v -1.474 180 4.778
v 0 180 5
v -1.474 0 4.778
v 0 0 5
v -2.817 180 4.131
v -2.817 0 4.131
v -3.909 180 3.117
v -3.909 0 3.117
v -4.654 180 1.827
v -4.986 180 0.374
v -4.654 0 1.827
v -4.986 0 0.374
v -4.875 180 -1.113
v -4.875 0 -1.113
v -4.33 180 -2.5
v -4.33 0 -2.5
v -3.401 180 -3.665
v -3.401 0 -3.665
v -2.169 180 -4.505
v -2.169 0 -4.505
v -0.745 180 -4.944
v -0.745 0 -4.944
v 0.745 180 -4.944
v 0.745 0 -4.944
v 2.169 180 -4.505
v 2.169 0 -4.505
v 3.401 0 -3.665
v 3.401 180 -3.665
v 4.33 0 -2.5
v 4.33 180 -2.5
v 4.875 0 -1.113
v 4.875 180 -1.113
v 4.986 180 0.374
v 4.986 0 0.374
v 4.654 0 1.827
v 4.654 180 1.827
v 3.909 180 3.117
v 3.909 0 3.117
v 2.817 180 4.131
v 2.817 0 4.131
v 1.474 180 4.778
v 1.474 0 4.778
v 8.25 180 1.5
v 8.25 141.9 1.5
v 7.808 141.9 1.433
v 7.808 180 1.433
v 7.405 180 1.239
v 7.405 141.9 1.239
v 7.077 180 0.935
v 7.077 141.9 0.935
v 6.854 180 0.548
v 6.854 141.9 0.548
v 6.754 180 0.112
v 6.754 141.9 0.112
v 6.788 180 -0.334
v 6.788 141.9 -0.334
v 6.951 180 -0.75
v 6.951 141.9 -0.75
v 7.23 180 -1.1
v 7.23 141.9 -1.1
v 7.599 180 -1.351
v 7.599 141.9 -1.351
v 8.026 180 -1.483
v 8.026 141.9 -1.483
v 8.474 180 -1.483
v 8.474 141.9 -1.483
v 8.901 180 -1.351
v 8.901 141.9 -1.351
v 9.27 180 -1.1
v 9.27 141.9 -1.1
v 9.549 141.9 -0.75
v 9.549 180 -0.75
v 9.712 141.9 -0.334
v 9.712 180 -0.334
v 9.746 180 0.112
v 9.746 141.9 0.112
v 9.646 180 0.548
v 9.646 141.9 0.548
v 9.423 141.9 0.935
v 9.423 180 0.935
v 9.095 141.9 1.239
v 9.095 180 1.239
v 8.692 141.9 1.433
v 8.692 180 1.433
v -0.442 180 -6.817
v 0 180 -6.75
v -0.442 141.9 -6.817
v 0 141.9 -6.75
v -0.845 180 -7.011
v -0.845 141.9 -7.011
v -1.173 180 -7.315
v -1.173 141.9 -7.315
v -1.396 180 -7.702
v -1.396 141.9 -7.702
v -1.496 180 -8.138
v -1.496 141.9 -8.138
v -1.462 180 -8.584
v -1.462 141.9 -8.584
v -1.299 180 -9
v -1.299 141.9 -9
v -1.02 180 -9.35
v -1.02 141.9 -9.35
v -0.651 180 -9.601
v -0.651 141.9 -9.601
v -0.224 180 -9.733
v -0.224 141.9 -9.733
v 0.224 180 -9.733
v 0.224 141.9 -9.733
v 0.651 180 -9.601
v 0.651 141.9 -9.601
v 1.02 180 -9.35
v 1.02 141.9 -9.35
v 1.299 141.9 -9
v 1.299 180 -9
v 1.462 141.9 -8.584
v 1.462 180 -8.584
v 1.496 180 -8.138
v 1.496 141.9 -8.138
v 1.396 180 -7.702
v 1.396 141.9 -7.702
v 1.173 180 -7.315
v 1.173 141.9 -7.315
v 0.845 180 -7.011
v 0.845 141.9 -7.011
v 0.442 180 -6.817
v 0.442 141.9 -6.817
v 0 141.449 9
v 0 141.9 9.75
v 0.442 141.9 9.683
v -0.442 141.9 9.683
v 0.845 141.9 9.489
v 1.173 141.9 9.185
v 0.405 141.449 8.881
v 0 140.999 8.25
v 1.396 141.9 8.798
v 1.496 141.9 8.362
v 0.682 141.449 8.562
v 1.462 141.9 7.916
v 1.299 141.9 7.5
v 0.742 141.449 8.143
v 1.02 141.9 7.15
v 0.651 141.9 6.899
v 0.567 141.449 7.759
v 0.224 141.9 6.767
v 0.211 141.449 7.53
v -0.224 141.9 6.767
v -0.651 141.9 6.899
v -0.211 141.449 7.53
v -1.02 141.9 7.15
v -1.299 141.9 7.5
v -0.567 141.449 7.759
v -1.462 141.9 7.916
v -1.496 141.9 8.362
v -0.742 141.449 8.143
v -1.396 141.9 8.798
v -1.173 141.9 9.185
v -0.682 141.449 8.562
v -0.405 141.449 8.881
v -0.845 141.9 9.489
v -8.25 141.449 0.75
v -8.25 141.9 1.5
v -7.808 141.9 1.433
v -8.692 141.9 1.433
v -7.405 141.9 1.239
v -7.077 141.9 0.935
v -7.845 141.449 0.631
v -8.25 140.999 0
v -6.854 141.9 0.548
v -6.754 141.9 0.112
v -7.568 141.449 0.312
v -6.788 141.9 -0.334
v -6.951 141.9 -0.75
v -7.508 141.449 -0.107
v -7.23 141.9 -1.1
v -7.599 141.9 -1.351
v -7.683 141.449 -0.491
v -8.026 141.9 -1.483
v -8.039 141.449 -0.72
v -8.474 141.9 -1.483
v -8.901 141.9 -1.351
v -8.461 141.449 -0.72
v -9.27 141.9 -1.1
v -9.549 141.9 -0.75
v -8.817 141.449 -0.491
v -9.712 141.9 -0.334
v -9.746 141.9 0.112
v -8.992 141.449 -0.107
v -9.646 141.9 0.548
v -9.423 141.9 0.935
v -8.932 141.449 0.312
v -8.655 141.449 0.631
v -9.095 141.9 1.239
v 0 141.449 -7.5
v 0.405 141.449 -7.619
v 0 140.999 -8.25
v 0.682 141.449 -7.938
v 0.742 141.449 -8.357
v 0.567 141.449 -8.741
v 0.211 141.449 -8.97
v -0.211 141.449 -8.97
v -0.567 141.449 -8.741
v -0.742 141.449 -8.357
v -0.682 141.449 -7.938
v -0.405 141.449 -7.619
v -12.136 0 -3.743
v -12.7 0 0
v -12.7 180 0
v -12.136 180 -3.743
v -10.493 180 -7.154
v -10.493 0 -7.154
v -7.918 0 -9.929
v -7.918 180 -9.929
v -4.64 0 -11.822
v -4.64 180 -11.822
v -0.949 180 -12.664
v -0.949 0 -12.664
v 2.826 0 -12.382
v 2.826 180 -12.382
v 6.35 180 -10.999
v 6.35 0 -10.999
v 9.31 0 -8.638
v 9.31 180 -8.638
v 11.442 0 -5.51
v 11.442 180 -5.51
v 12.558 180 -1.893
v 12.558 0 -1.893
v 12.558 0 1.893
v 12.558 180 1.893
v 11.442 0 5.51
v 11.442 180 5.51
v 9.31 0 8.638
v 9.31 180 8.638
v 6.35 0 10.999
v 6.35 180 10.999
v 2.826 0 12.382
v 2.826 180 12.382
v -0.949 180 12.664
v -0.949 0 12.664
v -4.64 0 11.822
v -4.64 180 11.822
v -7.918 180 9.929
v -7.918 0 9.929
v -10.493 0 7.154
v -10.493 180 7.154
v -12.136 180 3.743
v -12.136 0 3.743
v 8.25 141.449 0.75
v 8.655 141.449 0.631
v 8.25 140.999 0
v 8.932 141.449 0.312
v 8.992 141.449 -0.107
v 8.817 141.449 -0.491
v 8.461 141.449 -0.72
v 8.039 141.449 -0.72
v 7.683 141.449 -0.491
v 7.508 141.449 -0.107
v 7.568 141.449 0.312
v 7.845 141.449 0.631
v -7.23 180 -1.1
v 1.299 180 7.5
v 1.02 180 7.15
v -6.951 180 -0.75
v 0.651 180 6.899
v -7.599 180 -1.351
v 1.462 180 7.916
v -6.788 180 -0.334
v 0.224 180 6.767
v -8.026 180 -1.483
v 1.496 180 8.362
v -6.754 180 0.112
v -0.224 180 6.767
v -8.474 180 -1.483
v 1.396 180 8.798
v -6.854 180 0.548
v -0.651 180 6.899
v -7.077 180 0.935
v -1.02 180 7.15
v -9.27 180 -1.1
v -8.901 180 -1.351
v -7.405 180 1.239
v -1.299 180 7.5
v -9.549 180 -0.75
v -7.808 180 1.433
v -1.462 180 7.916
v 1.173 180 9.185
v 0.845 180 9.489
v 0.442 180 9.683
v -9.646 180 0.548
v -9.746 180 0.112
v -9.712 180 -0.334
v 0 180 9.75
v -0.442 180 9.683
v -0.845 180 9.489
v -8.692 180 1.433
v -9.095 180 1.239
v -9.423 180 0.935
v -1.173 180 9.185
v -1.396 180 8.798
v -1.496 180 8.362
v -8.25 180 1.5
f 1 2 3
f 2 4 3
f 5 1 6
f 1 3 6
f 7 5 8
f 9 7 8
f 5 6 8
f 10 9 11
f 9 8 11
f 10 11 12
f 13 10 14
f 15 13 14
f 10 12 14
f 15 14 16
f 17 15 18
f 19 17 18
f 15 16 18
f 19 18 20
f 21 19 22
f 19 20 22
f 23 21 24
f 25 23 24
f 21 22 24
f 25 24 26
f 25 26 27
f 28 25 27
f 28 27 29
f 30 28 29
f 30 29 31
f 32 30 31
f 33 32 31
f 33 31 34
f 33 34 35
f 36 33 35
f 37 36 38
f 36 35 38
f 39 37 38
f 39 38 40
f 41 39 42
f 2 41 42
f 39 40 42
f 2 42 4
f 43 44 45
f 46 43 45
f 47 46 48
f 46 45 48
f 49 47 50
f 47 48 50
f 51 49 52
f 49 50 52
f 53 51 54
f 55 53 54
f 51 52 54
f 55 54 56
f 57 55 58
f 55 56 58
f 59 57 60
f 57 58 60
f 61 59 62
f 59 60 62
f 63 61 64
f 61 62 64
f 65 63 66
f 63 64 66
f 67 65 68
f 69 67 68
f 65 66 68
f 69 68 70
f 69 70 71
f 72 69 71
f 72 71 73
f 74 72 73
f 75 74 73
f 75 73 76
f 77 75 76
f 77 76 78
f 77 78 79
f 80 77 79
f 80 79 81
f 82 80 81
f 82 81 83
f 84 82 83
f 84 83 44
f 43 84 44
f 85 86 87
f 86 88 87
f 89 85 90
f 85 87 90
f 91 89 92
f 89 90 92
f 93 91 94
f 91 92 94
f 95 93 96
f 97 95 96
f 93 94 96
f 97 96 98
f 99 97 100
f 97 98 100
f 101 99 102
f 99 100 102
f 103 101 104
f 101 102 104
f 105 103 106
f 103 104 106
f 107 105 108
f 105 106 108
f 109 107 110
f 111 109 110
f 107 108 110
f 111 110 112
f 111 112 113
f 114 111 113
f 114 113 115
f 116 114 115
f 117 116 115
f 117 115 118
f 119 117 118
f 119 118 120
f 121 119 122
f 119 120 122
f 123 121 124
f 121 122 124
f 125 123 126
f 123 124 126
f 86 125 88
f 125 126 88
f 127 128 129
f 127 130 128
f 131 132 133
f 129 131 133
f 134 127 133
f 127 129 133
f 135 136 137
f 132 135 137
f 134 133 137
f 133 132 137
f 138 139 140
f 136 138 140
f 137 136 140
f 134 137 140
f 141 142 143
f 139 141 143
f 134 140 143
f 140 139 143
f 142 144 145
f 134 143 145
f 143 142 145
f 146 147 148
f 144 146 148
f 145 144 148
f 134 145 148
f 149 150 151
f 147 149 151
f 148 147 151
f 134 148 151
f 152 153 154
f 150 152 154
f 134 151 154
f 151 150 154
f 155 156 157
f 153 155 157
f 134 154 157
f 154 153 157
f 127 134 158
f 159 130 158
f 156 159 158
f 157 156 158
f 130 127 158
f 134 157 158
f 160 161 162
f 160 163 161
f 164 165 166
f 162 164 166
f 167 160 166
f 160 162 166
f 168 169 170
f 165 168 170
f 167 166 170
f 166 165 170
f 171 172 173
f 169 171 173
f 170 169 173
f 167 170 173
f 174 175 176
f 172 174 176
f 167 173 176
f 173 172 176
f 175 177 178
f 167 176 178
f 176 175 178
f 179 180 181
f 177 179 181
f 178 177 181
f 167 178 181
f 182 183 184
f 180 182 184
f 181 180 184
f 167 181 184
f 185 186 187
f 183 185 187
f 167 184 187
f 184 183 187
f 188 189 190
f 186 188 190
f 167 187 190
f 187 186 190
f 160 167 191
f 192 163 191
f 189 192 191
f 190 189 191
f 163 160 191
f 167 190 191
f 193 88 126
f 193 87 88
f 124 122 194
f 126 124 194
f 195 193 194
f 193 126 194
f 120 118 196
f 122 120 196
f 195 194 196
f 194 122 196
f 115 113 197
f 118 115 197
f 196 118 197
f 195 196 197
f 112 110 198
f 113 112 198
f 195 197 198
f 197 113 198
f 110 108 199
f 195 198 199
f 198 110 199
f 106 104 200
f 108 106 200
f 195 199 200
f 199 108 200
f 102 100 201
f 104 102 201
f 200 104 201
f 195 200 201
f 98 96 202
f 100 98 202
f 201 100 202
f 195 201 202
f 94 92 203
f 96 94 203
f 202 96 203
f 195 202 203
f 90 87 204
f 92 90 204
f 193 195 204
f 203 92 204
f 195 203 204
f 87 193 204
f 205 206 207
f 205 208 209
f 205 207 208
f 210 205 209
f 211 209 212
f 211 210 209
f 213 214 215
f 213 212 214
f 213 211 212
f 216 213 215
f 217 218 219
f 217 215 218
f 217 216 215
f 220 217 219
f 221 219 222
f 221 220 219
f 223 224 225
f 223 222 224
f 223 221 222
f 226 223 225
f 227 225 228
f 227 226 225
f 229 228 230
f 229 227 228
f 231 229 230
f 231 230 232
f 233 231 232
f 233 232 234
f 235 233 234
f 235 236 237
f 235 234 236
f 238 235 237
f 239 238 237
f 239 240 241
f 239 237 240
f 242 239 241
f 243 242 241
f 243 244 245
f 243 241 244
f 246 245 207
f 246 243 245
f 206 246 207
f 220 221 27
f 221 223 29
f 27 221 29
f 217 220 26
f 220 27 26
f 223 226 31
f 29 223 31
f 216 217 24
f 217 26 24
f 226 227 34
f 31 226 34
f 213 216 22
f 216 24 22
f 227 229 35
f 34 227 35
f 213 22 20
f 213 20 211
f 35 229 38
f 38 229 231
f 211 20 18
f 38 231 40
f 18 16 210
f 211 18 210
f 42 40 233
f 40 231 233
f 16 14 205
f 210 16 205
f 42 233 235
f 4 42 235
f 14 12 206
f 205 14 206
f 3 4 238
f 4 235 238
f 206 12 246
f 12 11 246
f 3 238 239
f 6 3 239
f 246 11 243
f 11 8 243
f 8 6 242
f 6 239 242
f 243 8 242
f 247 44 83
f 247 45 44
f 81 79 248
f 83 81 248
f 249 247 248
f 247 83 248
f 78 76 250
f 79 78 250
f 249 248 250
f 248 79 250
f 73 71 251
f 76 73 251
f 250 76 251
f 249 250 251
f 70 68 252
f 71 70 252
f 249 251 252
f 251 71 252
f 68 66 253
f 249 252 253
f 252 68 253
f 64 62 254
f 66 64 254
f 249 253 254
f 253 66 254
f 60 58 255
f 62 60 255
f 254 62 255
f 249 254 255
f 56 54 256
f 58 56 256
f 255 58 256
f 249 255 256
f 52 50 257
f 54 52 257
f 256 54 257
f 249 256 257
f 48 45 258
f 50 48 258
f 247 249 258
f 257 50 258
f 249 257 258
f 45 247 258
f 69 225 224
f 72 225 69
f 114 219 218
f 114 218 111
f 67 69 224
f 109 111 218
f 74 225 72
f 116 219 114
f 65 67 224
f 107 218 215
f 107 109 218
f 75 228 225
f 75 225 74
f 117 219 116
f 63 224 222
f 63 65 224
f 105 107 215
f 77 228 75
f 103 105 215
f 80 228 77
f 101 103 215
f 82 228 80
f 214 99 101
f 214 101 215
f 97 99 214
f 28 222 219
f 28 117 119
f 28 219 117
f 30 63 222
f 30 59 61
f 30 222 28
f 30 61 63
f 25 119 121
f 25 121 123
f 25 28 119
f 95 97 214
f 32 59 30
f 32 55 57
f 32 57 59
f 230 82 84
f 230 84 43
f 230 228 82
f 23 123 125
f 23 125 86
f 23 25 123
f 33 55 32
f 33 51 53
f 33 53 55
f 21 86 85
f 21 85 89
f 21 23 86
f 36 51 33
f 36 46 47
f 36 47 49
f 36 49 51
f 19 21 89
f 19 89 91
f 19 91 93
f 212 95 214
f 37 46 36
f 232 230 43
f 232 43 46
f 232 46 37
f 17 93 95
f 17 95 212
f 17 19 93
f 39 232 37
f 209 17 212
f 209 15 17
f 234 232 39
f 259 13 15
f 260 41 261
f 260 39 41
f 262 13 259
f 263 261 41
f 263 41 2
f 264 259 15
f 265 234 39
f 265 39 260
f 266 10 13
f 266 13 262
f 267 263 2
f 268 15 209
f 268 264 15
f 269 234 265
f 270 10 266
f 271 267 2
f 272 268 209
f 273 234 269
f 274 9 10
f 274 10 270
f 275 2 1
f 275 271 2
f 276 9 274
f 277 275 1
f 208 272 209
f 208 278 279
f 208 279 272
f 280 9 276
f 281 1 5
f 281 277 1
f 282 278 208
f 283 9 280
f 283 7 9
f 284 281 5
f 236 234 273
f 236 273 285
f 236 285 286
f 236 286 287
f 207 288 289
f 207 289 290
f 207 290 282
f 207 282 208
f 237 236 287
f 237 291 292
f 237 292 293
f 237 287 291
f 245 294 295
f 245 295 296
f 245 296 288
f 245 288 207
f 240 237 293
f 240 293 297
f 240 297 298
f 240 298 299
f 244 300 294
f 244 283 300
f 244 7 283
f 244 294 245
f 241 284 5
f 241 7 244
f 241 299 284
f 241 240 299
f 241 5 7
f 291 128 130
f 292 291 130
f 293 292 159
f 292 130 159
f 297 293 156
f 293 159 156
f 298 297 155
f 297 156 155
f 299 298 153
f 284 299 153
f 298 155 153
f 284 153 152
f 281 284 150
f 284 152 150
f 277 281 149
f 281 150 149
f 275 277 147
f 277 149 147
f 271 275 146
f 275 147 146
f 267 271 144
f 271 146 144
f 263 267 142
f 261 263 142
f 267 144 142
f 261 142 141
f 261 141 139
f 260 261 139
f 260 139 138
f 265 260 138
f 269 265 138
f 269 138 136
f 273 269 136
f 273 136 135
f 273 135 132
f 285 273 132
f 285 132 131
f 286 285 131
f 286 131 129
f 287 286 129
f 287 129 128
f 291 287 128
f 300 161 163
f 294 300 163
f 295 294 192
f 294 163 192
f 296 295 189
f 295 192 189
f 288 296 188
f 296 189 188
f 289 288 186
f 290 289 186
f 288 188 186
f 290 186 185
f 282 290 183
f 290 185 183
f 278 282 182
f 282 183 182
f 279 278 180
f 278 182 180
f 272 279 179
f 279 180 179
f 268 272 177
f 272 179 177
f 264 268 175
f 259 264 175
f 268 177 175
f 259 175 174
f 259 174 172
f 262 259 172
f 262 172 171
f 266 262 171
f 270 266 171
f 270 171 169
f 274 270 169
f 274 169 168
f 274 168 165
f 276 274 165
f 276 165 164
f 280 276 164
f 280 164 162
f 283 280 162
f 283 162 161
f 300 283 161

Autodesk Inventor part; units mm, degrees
ref_plane "YZ Plane" through (0, 0, 0) normal (1, 0, 0) x (0, 1, 0)
ref_plane "XZ Plane" through (0, 0, 0) normal (0, 1, 0) x (-1, 0, 0)
ref_plane "XY Plane" through (0, 0, 0) normal (0, 0, 1) x (1, 0, 0)
sketch "Sketch1" plane through (0, 0, 0) normal (0, 1, 0) x (-1, 0, 0)
  circle A0 centre (0, 0) radius 12.7
  dimension "d0" = 25.4
extrude "Extrusion1" add sketch "Sketch1" along normal blind 180
sketch "Sketch3" plane through (0, 180, 0) normal (0, 1, 0) x (1, 0, 0)
  point P0 (0, 0)
  point P1 (0, 0)
hole "Hole2" at (0, 180, 0) direction (0, -1, 0) diameter 10 end through all
sketch "Sketch4" plane through (0, 180, 0) normal (0, 1, 0) x (1, 0, 0)
  point P0 (0, 0)
  point P1 (0, -8.25)
  point P2 (-8.25, 0)
  point P3 (0, 8.25)
  point P4 (8.25, 0)
  dimension "d17" = 8.25
  dimension "d20" = 360
hole "Hole3" at (0, 180, 8.25) at (-8.25, 180, 0) at (0, 180, -8.25) at (8.25, 180, 0) direction (0, -1, 0) diameter 3 depth 38.1 tip angle 118
thread "Thread1" size "M3x0.5" class "6H" standard "ANSI Metric M Profile" full length
thread "Thread2" size "M3x0.5" class "6H" standard "ANSI Metric M Profile" full length
thread "Thread3" size "M3x0.5" class "6H" standard "ANSI Metric M Profile" full length
thread "Thread4" size "M3x0.5" class "6H" standard "ANSI Metric M Profile" full length
properties part number "BarraSolidaMotor"
